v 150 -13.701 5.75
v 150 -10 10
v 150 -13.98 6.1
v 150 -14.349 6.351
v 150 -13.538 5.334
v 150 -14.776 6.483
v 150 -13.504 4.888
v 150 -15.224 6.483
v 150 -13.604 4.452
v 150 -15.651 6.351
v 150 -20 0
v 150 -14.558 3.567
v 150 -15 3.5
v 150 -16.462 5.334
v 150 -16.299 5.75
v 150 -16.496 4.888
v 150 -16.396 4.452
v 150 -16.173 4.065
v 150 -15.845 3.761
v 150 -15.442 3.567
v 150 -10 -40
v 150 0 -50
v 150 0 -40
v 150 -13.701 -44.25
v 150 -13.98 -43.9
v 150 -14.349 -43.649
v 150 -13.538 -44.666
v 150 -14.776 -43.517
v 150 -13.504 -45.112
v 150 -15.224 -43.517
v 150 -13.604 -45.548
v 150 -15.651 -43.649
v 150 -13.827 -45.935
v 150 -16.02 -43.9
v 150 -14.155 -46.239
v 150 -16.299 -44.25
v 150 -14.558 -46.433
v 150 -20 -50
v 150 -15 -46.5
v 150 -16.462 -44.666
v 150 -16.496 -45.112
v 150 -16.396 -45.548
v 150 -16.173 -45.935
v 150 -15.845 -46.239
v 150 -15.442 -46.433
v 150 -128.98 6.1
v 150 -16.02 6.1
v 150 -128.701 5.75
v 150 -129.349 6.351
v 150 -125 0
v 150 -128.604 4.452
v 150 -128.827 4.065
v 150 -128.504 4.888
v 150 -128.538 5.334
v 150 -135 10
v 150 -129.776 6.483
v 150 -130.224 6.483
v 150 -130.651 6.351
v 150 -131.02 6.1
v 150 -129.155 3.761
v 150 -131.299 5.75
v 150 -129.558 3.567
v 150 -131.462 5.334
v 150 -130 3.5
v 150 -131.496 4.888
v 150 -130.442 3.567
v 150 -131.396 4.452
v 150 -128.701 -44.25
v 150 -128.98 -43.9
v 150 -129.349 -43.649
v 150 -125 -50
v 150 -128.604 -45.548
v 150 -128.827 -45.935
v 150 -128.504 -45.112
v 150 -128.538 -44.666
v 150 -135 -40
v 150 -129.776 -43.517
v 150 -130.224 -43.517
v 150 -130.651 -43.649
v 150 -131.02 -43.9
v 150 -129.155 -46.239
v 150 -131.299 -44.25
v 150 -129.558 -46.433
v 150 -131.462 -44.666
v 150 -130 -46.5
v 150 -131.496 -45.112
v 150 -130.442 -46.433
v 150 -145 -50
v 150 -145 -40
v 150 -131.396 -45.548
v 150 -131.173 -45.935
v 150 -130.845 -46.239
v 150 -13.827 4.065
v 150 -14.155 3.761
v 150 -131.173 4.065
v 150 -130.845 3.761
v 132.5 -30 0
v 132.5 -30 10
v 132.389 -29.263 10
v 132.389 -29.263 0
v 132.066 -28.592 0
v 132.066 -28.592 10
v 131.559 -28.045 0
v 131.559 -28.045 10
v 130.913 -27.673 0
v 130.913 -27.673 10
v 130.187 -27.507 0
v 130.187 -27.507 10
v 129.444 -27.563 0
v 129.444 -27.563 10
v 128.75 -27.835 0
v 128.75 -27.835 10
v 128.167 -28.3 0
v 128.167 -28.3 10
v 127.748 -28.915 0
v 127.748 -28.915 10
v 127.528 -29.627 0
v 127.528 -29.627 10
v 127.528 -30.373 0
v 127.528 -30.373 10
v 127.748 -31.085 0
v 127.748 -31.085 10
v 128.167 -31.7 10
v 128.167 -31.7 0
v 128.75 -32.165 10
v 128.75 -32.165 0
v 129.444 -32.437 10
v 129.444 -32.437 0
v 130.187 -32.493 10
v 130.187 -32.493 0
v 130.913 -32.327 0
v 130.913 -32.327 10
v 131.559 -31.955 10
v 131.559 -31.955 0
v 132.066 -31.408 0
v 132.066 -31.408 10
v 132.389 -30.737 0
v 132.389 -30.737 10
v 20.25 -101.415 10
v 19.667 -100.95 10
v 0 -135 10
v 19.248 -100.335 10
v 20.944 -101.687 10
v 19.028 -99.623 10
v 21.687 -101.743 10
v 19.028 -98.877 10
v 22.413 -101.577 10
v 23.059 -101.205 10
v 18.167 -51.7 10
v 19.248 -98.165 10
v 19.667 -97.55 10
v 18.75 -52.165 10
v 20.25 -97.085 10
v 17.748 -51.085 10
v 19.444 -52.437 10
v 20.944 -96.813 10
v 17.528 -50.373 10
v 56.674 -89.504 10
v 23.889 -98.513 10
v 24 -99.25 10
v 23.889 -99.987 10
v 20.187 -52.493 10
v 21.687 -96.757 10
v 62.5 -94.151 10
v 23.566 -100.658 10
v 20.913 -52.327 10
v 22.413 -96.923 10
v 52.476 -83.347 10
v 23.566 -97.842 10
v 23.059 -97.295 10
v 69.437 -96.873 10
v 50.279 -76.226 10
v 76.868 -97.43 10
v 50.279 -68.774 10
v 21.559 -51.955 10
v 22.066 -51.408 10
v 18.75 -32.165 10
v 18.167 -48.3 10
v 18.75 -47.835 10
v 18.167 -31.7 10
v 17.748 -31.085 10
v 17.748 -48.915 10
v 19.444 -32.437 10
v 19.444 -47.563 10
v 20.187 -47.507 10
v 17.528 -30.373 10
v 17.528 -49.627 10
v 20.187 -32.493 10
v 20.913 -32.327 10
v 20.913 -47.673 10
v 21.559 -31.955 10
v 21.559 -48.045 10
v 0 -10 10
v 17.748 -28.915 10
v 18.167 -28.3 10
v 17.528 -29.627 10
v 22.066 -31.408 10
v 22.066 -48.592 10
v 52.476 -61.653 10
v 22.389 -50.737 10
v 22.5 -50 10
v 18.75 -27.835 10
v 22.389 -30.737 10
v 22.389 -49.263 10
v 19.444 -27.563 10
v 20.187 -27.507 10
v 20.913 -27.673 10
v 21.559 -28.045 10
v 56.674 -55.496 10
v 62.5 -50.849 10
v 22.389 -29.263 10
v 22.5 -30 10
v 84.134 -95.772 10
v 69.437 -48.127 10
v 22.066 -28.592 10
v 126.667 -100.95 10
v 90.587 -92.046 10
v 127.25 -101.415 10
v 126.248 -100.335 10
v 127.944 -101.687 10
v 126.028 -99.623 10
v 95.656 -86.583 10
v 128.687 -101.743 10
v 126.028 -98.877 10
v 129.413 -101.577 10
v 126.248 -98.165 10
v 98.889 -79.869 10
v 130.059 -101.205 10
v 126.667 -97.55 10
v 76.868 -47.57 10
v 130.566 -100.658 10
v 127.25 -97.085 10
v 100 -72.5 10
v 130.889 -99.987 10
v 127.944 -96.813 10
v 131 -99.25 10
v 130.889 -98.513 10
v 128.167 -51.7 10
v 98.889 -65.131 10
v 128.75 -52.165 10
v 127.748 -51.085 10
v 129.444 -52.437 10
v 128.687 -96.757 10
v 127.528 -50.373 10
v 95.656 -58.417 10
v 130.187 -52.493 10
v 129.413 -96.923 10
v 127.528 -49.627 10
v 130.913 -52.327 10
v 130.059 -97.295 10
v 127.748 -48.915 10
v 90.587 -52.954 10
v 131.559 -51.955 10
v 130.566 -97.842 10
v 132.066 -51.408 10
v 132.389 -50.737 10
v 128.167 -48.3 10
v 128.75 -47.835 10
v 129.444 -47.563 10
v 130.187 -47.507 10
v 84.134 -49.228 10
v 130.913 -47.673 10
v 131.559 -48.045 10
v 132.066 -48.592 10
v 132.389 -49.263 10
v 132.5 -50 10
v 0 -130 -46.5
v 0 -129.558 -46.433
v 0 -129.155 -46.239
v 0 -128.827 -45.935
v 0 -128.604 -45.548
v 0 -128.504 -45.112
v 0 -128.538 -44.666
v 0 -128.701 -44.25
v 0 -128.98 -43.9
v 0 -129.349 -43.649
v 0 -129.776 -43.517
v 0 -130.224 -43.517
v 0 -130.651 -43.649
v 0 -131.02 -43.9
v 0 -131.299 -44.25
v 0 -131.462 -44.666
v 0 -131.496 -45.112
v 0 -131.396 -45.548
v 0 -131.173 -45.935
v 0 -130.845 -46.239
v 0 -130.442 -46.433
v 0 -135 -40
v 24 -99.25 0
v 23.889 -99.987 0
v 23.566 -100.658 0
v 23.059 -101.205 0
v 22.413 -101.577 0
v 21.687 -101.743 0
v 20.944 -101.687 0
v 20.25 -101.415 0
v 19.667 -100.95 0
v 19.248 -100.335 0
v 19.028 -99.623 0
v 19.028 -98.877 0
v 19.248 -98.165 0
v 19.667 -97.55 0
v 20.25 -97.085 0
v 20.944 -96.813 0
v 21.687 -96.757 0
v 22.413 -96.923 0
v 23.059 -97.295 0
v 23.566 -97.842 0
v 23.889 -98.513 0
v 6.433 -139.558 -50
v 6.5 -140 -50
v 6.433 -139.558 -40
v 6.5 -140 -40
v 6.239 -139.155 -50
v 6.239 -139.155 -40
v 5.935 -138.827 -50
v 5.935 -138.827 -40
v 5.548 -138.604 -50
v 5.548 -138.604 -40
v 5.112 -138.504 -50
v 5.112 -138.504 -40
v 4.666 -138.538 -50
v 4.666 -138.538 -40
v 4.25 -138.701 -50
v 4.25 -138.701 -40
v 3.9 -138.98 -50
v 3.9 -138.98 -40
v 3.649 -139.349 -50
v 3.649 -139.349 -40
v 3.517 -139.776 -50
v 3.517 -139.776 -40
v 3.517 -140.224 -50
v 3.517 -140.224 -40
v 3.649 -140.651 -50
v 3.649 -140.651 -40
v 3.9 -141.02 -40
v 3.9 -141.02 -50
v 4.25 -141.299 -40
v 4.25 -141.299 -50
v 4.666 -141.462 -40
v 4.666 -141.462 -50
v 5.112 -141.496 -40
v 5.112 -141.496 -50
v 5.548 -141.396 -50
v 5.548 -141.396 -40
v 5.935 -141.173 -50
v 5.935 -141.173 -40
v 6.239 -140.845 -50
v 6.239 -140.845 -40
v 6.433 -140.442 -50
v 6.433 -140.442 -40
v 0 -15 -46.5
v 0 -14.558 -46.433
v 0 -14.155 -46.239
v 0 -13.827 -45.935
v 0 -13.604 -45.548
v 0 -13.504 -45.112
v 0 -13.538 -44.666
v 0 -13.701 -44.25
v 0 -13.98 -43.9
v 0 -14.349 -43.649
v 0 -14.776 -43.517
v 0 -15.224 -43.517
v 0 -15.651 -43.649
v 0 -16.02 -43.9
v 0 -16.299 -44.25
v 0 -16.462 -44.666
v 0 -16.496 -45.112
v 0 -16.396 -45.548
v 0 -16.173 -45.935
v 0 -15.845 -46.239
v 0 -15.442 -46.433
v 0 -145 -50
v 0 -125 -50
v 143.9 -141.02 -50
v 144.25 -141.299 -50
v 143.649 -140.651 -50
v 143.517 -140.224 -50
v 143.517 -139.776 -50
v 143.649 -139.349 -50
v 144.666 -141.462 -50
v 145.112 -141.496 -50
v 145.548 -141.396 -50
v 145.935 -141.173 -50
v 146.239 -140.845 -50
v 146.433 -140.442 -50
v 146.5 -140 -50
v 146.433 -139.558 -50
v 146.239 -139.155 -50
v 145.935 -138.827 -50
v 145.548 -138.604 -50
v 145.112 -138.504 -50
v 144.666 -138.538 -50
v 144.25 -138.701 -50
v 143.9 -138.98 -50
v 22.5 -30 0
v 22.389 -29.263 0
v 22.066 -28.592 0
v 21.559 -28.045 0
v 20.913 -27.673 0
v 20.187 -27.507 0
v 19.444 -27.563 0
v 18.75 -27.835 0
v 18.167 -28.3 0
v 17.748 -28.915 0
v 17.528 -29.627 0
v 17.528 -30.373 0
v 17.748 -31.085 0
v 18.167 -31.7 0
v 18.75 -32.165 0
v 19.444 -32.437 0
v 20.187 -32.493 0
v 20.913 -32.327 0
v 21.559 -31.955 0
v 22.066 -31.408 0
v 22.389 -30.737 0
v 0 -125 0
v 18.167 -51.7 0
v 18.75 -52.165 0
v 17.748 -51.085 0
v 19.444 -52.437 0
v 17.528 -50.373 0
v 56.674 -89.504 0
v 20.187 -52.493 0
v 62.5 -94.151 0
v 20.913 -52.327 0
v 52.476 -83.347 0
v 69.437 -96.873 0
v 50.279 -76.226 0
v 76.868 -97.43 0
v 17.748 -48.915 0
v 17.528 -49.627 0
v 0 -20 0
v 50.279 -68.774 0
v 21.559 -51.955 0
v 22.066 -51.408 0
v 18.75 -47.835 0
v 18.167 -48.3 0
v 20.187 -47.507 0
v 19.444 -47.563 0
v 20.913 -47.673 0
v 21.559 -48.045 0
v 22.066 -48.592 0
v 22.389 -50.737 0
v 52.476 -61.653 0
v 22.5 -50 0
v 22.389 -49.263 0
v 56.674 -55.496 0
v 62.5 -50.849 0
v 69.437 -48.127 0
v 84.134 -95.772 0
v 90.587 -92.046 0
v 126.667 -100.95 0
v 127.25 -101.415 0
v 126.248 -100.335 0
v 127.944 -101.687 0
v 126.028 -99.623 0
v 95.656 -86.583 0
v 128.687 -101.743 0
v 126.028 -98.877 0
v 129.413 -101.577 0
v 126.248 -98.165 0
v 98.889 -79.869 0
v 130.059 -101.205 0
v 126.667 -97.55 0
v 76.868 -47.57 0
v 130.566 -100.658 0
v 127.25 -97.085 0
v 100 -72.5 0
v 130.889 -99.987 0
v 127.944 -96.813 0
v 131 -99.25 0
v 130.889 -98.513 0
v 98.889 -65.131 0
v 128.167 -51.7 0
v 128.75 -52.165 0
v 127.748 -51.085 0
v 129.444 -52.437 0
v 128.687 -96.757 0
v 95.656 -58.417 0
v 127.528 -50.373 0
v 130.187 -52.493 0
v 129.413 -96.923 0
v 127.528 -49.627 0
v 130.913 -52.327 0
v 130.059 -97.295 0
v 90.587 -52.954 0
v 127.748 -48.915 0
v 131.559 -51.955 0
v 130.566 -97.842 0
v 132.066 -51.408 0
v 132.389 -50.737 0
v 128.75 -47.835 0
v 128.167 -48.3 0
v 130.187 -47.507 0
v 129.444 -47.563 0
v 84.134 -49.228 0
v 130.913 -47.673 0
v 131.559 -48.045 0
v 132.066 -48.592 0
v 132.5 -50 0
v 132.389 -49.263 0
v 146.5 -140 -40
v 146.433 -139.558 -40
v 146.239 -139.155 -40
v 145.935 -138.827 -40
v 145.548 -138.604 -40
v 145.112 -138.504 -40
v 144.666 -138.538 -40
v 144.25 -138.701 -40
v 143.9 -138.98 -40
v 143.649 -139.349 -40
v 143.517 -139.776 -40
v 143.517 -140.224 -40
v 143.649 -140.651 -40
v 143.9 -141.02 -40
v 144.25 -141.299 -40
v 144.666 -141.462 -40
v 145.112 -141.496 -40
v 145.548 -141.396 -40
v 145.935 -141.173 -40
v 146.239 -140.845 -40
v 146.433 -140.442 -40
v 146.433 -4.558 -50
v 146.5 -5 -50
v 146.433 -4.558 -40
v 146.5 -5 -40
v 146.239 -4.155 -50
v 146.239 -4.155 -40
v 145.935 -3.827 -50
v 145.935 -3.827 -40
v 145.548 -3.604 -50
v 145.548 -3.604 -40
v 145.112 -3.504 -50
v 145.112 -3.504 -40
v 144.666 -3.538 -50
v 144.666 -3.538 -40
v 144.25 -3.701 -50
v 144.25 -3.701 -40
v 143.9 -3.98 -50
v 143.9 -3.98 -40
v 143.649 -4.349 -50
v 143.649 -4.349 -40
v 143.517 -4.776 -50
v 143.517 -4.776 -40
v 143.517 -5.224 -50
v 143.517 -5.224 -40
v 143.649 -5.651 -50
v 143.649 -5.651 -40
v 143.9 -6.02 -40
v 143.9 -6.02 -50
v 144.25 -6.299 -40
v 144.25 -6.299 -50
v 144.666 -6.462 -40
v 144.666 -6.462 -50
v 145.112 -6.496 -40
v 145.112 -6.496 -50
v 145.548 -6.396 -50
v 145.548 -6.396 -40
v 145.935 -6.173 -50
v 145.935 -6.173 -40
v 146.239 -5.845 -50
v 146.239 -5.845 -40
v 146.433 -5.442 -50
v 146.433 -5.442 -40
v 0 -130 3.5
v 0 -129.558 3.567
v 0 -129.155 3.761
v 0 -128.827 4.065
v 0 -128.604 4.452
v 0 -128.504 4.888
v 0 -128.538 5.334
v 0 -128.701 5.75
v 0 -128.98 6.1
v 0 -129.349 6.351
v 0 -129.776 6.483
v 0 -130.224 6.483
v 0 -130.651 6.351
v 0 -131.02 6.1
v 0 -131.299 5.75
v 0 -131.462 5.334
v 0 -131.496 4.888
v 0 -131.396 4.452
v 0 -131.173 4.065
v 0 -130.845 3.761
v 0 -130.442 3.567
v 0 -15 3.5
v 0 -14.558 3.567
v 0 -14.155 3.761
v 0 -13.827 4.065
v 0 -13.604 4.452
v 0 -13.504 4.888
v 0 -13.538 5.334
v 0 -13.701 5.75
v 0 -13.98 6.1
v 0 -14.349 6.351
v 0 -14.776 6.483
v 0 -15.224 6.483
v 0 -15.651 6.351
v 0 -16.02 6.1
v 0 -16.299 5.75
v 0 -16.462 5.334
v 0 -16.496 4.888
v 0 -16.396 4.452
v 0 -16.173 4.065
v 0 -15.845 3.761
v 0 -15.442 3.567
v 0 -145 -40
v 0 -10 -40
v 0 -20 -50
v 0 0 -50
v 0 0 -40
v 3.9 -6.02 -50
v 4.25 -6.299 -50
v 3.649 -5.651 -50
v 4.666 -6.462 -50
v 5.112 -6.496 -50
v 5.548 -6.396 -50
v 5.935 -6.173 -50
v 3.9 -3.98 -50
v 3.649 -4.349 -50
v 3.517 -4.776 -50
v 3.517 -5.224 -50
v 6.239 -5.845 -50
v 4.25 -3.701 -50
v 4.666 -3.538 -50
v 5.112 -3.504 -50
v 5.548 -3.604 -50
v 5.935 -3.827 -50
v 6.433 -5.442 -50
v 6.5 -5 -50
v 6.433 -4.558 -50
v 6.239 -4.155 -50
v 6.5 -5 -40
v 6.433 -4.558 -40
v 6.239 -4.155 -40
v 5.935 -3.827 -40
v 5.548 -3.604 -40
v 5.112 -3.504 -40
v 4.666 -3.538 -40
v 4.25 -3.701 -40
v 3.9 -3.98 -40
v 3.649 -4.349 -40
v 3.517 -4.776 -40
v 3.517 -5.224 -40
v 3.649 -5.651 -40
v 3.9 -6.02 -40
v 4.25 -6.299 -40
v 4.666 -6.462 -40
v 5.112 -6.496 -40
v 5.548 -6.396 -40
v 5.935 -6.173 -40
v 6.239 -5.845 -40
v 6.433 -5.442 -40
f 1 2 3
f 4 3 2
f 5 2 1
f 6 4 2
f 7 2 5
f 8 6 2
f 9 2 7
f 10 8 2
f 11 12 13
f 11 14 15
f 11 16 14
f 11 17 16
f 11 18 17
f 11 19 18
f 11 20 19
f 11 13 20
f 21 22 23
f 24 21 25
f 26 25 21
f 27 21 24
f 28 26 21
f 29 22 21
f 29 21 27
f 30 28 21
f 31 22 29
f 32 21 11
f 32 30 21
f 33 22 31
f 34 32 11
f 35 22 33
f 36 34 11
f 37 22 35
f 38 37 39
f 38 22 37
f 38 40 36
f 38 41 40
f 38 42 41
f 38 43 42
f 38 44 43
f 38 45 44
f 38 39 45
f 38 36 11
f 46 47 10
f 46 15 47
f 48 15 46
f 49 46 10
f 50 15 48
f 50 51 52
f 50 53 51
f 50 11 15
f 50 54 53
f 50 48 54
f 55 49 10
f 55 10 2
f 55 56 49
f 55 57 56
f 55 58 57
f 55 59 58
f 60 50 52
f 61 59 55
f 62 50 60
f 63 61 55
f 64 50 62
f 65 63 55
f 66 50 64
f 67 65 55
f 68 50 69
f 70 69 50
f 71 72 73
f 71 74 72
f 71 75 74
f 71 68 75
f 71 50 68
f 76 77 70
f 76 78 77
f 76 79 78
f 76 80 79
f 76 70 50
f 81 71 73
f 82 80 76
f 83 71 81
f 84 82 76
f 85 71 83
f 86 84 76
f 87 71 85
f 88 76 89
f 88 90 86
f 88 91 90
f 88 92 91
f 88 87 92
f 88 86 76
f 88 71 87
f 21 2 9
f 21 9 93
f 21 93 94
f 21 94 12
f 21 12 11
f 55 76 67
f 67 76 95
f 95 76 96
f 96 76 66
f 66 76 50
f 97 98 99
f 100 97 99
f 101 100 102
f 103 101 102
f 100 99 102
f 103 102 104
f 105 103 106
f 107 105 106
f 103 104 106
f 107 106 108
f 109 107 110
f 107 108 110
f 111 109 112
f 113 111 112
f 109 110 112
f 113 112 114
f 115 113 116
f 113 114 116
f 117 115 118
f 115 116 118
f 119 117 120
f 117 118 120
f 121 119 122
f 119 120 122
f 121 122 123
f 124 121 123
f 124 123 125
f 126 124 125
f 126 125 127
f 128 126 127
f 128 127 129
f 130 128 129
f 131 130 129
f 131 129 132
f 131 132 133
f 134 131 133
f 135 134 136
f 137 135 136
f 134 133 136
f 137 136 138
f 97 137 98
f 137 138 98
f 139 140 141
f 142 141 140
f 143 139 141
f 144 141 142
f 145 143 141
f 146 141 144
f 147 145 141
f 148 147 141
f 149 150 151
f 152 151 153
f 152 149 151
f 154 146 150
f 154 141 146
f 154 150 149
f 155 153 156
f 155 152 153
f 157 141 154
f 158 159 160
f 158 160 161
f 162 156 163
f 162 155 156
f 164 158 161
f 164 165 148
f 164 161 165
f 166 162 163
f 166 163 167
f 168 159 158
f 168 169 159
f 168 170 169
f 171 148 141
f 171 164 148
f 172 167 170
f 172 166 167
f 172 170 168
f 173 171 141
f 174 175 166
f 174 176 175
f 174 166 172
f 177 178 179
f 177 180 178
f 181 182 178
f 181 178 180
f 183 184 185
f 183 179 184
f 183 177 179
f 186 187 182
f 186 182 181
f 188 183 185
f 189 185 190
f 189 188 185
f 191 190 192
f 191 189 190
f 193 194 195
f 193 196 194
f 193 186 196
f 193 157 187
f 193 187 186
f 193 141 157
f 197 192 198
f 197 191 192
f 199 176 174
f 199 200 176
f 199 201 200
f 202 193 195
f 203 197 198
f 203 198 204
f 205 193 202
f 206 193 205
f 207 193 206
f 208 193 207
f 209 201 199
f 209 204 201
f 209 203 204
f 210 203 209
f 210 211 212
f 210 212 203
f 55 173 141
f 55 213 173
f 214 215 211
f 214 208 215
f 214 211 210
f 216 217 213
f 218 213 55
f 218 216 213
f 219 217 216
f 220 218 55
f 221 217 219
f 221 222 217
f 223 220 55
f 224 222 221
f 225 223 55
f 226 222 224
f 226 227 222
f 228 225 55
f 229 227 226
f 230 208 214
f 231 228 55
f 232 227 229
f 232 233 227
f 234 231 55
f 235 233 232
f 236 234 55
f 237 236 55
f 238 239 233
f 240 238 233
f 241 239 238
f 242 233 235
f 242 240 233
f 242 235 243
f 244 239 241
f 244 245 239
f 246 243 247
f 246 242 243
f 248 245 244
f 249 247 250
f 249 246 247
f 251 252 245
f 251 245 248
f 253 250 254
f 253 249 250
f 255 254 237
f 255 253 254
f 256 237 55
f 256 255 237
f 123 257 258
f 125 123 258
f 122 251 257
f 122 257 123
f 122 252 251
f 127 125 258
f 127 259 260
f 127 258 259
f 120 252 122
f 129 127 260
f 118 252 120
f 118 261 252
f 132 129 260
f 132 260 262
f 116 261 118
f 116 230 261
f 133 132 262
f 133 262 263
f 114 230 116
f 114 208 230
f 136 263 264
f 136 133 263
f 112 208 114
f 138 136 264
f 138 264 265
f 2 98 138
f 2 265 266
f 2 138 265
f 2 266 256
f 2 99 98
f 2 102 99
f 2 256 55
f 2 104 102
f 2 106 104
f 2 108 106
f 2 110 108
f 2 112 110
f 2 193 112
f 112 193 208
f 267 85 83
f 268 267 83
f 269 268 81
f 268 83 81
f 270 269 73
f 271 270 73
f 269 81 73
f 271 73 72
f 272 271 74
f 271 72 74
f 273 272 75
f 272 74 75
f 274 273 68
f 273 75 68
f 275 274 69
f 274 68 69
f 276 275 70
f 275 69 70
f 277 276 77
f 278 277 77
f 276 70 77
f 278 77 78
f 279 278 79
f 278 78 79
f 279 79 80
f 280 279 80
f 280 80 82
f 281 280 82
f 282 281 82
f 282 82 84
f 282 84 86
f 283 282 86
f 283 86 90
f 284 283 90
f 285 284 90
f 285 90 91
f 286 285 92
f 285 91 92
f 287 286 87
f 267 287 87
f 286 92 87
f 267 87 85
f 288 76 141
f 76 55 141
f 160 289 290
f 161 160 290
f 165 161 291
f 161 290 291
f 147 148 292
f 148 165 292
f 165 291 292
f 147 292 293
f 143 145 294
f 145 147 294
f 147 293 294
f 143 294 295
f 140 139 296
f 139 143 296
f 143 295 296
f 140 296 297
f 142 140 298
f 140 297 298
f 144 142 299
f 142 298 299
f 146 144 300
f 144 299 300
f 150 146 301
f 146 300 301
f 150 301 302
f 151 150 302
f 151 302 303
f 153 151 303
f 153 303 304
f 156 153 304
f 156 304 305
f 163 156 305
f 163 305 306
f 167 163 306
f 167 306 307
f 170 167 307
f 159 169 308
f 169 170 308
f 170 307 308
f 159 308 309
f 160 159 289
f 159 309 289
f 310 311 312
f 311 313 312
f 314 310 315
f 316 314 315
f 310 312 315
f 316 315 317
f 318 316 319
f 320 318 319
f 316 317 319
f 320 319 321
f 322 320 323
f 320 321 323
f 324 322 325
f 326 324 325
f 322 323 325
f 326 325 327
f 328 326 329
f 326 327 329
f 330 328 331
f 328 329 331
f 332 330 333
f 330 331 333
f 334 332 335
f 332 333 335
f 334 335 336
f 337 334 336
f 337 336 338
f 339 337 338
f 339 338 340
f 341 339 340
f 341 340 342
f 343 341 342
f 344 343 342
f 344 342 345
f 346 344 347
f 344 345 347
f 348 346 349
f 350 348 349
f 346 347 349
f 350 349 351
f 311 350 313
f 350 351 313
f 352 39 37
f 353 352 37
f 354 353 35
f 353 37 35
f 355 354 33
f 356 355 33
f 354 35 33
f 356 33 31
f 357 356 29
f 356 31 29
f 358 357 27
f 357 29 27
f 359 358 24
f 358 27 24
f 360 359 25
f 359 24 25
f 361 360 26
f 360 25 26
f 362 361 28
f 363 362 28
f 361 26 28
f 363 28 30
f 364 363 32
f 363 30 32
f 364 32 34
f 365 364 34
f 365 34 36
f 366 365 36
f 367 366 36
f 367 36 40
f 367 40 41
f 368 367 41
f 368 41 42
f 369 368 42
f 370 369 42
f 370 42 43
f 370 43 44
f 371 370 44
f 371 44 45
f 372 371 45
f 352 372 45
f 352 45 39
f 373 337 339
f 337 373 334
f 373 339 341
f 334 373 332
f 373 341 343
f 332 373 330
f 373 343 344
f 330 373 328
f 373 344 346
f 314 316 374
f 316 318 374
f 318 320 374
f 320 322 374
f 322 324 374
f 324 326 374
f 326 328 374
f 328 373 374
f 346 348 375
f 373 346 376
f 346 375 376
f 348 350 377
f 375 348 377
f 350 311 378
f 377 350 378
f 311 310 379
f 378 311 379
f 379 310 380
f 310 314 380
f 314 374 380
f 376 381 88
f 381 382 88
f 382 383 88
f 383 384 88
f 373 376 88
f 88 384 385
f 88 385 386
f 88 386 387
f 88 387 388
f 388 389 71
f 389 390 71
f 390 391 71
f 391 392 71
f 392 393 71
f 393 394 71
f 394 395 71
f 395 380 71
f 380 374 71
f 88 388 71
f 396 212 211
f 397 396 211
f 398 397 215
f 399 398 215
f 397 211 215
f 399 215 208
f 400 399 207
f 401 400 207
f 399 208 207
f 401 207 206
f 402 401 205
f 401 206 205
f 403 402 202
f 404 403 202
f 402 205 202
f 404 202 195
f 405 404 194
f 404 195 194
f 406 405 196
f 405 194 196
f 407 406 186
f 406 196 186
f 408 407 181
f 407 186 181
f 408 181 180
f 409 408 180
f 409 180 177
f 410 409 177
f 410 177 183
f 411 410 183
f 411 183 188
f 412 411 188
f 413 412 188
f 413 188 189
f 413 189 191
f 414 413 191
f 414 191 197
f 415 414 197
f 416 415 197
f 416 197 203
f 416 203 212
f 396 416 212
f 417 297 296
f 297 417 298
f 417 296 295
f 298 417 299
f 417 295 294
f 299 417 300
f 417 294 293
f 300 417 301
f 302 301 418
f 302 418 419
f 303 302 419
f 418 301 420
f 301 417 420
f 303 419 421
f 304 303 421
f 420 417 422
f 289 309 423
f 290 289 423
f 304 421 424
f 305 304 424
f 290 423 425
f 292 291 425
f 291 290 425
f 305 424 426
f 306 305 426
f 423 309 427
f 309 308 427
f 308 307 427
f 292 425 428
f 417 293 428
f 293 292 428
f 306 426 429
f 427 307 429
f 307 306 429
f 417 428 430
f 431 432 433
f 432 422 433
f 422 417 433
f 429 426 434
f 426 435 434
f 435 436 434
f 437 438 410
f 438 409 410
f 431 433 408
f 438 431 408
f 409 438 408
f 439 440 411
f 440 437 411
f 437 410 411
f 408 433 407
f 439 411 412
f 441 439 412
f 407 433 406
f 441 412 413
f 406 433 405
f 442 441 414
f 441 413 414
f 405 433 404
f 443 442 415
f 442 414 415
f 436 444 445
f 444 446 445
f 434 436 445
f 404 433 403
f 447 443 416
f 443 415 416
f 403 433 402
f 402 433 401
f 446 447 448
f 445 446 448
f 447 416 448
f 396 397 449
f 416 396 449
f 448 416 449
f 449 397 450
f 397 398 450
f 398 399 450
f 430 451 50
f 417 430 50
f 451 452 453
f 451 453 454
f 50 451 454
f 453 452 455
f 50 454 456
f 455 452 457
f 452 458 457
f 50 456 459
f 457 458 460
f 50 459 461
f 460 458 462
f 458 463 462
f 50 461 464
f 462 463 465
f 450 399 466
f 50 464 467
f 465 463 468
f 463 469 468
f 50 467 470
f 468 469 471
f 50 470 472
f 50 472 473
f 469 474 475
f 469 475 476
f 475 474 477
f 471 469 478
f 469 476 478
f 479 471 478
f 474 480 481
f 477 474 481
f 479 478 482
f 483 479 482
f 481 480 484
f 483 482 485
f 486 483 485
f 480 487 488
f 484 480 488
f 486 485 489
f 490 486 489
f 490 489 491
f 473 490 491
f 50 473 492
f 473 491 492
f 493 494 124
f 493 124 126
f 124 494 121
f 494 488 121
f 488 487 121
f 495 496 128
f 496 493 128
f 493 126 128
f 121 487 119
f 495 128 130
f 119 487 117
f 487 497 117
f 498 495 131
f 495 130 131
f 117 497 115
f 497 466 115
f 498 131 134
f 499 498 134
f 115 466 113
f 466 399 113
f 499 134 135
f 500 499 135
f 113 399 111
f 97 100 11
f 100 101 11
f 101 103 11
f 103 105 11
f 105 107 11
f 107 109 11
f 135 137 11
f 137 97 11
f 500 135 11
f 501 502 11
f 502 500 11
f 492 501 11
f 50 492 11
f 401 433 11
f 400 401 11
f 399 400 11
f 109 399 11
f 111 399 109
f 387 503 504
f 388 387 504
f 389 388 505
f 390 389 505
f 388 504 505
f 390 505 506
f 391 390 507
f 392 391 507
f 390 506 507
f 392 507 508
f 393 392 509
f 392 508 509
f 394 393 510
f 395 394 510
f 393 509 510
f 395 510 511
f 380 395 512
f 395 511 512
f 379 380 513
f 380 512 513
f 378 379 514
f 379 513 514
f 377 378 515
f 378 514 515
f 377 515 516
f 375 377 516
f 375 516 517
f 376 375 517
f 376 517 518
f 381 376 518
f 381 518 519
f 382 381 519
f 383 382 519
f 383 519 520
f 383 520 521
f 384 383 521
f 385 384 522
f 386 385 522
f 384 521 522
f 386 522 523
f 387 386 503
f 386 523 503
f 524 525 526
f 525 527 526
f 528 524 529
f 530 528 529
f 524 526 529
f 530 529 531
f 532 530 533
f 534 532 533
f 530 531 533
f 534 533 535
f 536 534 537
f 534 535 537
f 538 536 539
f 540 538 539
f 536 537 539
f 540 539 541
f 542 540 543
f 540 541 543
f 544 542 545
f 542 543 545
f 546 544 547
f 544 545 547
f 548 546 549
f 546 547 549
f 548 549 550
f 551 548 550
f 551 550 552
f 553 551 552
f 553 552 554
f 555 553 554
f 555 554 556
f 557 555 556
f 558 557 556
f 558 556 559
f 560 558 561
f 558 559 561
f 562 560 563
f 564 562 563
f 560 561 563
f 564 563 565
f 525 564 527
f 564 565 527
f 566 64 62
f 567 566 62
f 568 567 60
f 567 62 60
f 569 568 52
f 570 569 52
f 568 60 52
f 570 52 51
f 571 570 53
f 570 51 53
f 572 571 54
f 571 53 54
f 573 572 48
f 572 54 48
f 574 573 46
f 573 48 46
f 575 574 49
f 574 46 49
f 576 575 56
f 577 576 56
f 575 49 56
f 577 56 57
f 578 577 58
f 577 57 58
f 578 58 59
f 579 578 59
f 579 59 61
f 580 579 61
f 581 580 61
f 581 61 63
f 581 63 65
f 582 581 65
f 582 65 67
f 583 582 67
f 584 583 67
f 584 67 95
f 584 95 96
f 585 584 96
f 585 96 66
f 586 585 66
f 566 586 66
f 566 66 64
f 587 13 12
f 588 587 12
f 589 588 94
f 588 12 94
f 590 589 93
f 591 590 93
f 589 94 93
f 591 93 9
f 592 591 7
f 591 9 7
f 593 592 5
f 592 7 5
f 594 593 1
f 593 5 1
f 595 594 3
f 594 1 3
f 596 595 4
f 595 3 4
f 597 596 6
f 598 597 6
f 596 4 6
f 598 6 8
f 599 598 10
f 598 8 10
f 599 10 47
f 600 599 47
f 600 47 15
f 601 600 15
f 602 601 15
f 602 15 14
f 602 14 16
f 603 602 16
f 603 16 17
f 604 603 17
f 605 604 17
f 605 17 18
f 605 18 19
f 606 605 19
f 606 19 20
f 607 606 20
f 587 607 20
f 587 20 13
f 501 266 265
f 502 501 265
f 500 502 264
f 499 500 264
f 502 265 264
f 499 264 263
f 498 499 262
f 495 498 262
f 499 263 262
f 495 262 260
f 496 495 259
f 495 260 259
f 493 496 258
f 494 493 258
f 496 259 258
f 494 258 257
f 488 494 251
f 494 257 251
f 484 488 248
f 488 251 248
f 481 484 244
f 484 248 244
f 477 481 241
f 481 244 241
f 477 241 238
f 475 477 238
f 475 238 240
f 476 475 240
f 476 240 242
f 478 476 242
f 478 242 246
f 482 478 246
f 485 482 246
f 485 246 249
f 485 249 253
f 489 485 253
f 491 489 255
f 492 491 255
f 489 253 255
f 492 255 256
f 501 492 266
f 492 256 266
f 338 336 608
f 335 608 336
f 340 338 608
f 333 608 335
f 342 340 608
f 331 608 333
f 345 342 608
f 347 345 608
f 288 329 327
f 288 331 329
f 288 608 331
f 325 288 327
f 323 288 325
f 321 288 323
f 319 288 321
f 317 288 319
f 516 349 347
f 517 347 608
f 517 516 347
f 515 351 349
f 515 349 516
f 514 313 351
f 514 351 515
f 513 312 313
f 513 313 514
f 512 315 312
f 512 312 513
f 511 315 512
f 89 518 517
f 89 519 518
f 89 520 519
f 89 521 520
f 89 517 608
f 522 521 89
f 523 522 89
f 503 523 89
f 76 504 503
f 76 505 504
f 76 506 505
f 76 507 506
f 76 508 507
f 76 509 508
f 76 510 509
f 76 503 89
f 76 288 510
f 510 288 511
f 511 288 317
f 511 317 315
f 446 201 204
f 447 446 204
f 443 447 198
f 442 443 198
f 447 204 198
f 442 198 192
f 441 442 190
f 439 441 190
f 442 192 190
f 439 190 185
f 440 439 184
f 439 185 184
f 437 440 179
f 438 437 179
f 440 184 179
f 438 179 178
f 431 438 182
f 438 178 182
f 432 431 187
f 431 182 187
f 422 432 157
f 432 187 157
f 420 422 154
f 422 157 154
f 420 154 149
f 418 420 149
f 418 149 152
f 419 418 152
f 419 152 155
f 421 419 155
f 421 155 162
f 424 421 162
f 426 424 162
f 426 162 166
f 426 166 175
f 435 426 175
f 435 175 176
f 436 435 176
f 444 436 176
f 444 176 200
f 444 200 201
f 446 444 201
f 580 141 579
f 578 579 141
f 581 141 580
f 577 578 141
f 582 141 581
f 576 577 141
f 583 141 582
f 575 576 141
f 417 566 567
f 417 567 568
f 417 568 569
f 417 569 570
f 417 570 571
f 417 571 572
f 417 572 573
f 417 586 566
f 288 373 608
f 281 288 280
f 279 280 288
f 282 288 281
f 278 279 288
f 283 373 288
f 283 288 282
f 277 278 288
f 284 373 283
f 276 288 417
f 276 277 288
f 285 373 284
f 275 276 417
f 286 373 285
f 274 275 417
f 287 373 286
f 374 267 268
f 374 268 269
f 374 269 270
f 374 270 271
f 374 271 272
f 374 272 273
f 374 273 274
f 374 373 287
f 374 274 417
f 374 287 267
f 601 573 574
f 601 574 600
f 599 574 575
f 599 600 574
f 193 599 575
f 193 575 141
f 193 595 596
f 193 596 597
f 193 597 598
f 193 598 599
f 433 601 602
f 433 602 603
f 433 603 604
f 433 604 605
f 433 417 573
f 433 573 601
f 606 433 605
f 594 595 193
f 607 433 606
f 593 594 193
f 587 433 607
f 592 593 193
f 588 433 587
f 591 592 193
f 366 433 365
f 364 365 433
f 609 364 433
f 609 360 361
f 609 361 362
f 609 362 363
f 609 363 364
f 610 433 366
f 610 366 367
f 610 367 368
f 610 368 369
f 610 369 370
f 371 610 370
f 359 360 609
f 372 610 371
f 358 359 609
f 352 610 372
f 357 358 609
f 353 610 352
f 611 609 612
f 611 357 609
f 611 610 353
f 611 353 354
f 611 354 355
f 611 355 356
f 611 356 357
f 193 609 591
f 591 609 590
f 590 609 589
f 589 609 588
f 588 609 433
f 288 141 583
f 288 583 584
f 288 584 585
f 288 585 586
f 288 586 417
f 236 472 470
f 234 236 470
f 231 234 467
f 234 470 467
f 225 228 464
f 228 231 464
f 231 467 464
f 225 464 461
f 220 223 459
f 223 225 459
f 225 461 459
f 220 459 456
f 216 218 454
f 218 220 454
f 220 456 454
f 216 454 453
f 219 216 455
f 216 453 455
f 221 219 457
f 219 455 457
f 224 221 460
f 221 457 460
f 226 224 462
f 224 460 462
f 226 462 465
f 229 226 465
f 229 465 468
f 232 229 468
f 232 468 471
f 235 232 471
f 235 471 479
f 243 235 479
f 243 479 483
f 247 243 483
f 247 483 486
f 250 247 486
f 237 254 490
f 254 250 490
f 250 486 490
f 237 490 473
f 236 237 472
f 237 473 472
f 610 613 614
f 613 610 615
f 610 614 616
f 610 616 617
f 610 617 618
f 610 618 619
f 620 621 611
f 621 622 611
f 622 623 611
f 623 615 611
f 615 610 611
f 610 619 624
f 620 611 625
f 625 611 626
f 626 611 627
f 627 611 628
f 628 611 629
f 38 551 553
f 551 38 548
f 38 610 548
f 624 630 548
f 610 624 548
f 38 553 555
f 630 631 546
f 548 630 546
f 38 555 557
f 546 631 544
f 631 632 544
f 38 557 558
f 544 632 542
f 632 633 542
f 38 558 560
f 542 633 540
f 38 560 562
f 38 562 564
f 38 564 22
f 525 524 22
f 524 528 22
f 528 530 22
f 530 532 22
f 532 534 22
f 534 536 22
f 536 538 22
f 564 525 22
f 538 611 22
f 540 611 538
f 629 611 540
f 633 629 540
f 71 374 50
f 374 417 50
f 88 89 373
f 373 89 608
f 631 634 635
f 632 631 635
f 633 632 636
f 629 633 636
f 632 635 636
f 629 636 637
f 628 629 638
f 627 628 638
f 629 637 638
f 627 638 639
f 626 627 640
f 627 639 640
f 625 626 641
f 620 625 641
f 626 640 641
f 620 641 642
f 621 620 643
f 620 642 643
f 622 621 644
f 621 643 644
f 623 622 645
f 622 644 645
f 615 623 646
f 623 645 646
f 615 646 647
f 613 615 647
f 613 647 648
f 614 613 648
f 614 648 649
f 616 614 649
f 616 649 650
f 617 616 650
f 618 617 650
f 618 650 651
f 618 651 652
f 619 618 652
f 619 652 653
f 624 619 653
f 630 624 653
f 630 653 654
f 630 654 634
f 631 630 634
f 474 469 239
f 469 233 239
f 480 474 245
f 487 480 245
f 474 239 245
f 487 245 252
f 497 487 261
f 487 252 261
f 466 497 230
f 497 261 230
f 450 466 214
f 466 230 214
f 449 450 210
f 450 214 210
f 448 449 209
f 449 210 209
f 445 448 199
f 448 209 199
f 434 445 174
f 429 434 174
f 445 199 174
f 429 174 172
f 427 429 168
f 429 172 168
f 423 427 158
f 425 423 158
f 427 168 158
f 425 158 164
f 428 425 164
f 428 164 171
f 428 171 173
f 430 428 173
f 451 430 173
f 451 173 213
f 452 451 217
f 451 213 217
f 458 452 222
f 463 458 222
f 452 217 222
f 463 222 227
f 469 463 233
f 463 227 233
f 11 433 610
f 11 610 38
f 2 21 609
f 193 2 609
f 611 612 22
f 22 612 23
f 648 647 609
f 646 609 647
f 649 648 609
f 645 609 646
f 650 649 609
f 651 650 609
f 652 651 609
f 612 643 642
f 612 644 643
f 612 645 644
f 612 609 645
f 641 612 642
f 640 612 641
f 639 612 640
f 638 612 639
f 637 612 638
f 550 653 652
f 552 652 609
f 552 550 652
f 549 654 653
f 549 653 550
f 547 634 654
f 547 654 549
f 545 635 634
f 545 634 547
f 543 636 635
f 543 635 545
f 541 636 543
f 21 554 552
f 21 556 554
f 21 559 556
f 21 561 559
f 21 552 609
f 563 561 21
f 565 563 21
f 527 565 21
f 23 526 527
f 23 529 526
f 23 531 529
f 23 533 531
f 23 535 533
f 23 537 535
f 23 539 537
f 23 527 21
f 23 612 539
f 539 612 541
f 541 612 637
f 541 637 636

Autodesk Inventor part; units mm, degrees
ref_plane "YZ Plane" through (0, 0, 0) normal (1, 0, 0) x (0, 1, 0)
ref_plane "XZ Plane" through (0, 0, 0) normal (0, 1, 0) x (-1, 0, 0)
ref_plane "XY Plane" through (0, 0, 0) normal (0, 0, 1) x (1, 0, 0)
sketch "스케치1" plane through (0, 0, 0) normal (0, 0, 1) x (1, 0, 0)
  line L0 (0, 0) -> (150, 0)
  line L1 (150, 0) -> (150, -145)
  line L2 (150, -145) -> (0, -145)
  line L3 (0, -145) -> (0, 0)
  line L4 (0, -20) -> (150, -20)
  line L5 (0, -125) -> (150, -125)
  line L6 (150, -135) -> (0, -135)
  line L7 (150, -10) -> (0, -10)
  circle A0 centre (21.5, -99.25) radius 2.5
  line L8 (75, -145) -> (75, -139.9922)
  circle A1 centre (128.5, -99.25) radius 2.5
  circle A2 centre (5, -5) radius 1.5
  circle A3 centre (145, -5) radius 1.5
  circle A4 centre (5, -140) radius 1.5
  circle A5 centre (145, -140) radius 1.5
  dimension "d0" = 150
  dimension "d1" = 145
  dimension "d2" = 20
  dimension "d3" = 20
  dimension "d8" = 10
  dimension "d9" = 10
  dimension "d21" = 45.75
  dimension "d22" = 21.5
  dimension "d23" = 5
  dimension "d24" = 3
  dimension "d25" = 5
  dimension "d26" = 5
  dimension "d27" = 5
  dimension "d28" = 5
  dimension "d29" = 5
extrude "돌출1" add sketch "스케치1" along normal blind 10 contours L7 L1 L4 L3 | L4 L1 L5 L3 | L5 L1 L6 L3
extrude "돌출2" add sketch "스케치1" against normal blind 50 contours L0 L1 L7 L3 | L7 L1 L4 L3 | L5 L1 L6 L3 | L6 L1 L2 L3 | A2 | A3 | A4 | A5
extrude "돌출3" cut sketch "스케치1" against normal blind 40 contours L0 L1 L7 L3 | L6 L1 L2 L3 | A2 | A3 | A4 | A5
sketch "스케치2" plane through (0, 0, 10) normal (0, 0, 1) x (1, 0, 0)
  circle A0 centre (20, -30) radius 2.5
  circle A1 centre (130, -30) radius 2.5
  line L0 (150, -135) -> (150, -10) projected
  line L1 (0, -10) -> (0, -135) projected
  line L2 (0, 0) -> (150, 0) projected
  circle A2 centre (20, -50) radius 2.5
  circle A3 centre (130, -50) radius 2.5
  circle A4 centre (75, -72.5) radius 25
  point P0 (0, -72.5)
  point P1 (0, -72.5)
  point P2 (75, 0)
  dimension "d14" = 20
  dimension "d15" = 20
  dimension "d16" = 5
  dimension "d17" = 30
  dimension "d18" = 5
  dimension "d19" = 20
  dimension "d20" = 50
extrude "돌출4" cut sketch "스케치2" against normal through all
extrude "돌출5" cut sketch "스케치1" against normal through all contours A2 | A3 | A4 | A5
sketch "스케치3" plane through (150, -135, 10) normal (1, 0, 0) x (0, 0, -1)
  circle A0 centre (55, 120) radius 1.5
  circle A1 centre (5, 120) radius 1.5
  circle A2 centre (5, 5) radius 1.5
  circle A3 centre (55, 5) radius 1.5
  line L0 (50, -10) -> (60, -10) projected
  line L1 (0, 0) -> (0, 125) projected
  line L2 (10, 10) -> (10, 115) projected
  line L3 (0, 0) -> (50, 0) projected
  line L4 (10, 10) -> (60, 10) projected
  point P0 (10, 135)
  point P1 (55, -10)
  dimension "d32" = 3
  dimension "d33" = 10
  dimension "d34" = 5
  dimension "d35" = 10
  dimension "d36" = 5
  dimension "d37" = 5
extrude "돌출6" cut sketch "스케치3" against normal through all
equation "\"d8\" = 0.5 * d2"
equation "\"d9\" = d8"
equation "\"d25\" = 0.5 * d9"
equation "\"d26\" = d25"
equation "\"d27\" = d25"
equation "\"d28\" = d25"
equation "\"d29\" = d27"
equation "\"d34\" = 0.5 * d33"
equation "\"d36\" = 0.5 * d35"
equation "\"d37\" = 0.5 * d35"
properties part number "WheelCorver_3D 인쇄"
